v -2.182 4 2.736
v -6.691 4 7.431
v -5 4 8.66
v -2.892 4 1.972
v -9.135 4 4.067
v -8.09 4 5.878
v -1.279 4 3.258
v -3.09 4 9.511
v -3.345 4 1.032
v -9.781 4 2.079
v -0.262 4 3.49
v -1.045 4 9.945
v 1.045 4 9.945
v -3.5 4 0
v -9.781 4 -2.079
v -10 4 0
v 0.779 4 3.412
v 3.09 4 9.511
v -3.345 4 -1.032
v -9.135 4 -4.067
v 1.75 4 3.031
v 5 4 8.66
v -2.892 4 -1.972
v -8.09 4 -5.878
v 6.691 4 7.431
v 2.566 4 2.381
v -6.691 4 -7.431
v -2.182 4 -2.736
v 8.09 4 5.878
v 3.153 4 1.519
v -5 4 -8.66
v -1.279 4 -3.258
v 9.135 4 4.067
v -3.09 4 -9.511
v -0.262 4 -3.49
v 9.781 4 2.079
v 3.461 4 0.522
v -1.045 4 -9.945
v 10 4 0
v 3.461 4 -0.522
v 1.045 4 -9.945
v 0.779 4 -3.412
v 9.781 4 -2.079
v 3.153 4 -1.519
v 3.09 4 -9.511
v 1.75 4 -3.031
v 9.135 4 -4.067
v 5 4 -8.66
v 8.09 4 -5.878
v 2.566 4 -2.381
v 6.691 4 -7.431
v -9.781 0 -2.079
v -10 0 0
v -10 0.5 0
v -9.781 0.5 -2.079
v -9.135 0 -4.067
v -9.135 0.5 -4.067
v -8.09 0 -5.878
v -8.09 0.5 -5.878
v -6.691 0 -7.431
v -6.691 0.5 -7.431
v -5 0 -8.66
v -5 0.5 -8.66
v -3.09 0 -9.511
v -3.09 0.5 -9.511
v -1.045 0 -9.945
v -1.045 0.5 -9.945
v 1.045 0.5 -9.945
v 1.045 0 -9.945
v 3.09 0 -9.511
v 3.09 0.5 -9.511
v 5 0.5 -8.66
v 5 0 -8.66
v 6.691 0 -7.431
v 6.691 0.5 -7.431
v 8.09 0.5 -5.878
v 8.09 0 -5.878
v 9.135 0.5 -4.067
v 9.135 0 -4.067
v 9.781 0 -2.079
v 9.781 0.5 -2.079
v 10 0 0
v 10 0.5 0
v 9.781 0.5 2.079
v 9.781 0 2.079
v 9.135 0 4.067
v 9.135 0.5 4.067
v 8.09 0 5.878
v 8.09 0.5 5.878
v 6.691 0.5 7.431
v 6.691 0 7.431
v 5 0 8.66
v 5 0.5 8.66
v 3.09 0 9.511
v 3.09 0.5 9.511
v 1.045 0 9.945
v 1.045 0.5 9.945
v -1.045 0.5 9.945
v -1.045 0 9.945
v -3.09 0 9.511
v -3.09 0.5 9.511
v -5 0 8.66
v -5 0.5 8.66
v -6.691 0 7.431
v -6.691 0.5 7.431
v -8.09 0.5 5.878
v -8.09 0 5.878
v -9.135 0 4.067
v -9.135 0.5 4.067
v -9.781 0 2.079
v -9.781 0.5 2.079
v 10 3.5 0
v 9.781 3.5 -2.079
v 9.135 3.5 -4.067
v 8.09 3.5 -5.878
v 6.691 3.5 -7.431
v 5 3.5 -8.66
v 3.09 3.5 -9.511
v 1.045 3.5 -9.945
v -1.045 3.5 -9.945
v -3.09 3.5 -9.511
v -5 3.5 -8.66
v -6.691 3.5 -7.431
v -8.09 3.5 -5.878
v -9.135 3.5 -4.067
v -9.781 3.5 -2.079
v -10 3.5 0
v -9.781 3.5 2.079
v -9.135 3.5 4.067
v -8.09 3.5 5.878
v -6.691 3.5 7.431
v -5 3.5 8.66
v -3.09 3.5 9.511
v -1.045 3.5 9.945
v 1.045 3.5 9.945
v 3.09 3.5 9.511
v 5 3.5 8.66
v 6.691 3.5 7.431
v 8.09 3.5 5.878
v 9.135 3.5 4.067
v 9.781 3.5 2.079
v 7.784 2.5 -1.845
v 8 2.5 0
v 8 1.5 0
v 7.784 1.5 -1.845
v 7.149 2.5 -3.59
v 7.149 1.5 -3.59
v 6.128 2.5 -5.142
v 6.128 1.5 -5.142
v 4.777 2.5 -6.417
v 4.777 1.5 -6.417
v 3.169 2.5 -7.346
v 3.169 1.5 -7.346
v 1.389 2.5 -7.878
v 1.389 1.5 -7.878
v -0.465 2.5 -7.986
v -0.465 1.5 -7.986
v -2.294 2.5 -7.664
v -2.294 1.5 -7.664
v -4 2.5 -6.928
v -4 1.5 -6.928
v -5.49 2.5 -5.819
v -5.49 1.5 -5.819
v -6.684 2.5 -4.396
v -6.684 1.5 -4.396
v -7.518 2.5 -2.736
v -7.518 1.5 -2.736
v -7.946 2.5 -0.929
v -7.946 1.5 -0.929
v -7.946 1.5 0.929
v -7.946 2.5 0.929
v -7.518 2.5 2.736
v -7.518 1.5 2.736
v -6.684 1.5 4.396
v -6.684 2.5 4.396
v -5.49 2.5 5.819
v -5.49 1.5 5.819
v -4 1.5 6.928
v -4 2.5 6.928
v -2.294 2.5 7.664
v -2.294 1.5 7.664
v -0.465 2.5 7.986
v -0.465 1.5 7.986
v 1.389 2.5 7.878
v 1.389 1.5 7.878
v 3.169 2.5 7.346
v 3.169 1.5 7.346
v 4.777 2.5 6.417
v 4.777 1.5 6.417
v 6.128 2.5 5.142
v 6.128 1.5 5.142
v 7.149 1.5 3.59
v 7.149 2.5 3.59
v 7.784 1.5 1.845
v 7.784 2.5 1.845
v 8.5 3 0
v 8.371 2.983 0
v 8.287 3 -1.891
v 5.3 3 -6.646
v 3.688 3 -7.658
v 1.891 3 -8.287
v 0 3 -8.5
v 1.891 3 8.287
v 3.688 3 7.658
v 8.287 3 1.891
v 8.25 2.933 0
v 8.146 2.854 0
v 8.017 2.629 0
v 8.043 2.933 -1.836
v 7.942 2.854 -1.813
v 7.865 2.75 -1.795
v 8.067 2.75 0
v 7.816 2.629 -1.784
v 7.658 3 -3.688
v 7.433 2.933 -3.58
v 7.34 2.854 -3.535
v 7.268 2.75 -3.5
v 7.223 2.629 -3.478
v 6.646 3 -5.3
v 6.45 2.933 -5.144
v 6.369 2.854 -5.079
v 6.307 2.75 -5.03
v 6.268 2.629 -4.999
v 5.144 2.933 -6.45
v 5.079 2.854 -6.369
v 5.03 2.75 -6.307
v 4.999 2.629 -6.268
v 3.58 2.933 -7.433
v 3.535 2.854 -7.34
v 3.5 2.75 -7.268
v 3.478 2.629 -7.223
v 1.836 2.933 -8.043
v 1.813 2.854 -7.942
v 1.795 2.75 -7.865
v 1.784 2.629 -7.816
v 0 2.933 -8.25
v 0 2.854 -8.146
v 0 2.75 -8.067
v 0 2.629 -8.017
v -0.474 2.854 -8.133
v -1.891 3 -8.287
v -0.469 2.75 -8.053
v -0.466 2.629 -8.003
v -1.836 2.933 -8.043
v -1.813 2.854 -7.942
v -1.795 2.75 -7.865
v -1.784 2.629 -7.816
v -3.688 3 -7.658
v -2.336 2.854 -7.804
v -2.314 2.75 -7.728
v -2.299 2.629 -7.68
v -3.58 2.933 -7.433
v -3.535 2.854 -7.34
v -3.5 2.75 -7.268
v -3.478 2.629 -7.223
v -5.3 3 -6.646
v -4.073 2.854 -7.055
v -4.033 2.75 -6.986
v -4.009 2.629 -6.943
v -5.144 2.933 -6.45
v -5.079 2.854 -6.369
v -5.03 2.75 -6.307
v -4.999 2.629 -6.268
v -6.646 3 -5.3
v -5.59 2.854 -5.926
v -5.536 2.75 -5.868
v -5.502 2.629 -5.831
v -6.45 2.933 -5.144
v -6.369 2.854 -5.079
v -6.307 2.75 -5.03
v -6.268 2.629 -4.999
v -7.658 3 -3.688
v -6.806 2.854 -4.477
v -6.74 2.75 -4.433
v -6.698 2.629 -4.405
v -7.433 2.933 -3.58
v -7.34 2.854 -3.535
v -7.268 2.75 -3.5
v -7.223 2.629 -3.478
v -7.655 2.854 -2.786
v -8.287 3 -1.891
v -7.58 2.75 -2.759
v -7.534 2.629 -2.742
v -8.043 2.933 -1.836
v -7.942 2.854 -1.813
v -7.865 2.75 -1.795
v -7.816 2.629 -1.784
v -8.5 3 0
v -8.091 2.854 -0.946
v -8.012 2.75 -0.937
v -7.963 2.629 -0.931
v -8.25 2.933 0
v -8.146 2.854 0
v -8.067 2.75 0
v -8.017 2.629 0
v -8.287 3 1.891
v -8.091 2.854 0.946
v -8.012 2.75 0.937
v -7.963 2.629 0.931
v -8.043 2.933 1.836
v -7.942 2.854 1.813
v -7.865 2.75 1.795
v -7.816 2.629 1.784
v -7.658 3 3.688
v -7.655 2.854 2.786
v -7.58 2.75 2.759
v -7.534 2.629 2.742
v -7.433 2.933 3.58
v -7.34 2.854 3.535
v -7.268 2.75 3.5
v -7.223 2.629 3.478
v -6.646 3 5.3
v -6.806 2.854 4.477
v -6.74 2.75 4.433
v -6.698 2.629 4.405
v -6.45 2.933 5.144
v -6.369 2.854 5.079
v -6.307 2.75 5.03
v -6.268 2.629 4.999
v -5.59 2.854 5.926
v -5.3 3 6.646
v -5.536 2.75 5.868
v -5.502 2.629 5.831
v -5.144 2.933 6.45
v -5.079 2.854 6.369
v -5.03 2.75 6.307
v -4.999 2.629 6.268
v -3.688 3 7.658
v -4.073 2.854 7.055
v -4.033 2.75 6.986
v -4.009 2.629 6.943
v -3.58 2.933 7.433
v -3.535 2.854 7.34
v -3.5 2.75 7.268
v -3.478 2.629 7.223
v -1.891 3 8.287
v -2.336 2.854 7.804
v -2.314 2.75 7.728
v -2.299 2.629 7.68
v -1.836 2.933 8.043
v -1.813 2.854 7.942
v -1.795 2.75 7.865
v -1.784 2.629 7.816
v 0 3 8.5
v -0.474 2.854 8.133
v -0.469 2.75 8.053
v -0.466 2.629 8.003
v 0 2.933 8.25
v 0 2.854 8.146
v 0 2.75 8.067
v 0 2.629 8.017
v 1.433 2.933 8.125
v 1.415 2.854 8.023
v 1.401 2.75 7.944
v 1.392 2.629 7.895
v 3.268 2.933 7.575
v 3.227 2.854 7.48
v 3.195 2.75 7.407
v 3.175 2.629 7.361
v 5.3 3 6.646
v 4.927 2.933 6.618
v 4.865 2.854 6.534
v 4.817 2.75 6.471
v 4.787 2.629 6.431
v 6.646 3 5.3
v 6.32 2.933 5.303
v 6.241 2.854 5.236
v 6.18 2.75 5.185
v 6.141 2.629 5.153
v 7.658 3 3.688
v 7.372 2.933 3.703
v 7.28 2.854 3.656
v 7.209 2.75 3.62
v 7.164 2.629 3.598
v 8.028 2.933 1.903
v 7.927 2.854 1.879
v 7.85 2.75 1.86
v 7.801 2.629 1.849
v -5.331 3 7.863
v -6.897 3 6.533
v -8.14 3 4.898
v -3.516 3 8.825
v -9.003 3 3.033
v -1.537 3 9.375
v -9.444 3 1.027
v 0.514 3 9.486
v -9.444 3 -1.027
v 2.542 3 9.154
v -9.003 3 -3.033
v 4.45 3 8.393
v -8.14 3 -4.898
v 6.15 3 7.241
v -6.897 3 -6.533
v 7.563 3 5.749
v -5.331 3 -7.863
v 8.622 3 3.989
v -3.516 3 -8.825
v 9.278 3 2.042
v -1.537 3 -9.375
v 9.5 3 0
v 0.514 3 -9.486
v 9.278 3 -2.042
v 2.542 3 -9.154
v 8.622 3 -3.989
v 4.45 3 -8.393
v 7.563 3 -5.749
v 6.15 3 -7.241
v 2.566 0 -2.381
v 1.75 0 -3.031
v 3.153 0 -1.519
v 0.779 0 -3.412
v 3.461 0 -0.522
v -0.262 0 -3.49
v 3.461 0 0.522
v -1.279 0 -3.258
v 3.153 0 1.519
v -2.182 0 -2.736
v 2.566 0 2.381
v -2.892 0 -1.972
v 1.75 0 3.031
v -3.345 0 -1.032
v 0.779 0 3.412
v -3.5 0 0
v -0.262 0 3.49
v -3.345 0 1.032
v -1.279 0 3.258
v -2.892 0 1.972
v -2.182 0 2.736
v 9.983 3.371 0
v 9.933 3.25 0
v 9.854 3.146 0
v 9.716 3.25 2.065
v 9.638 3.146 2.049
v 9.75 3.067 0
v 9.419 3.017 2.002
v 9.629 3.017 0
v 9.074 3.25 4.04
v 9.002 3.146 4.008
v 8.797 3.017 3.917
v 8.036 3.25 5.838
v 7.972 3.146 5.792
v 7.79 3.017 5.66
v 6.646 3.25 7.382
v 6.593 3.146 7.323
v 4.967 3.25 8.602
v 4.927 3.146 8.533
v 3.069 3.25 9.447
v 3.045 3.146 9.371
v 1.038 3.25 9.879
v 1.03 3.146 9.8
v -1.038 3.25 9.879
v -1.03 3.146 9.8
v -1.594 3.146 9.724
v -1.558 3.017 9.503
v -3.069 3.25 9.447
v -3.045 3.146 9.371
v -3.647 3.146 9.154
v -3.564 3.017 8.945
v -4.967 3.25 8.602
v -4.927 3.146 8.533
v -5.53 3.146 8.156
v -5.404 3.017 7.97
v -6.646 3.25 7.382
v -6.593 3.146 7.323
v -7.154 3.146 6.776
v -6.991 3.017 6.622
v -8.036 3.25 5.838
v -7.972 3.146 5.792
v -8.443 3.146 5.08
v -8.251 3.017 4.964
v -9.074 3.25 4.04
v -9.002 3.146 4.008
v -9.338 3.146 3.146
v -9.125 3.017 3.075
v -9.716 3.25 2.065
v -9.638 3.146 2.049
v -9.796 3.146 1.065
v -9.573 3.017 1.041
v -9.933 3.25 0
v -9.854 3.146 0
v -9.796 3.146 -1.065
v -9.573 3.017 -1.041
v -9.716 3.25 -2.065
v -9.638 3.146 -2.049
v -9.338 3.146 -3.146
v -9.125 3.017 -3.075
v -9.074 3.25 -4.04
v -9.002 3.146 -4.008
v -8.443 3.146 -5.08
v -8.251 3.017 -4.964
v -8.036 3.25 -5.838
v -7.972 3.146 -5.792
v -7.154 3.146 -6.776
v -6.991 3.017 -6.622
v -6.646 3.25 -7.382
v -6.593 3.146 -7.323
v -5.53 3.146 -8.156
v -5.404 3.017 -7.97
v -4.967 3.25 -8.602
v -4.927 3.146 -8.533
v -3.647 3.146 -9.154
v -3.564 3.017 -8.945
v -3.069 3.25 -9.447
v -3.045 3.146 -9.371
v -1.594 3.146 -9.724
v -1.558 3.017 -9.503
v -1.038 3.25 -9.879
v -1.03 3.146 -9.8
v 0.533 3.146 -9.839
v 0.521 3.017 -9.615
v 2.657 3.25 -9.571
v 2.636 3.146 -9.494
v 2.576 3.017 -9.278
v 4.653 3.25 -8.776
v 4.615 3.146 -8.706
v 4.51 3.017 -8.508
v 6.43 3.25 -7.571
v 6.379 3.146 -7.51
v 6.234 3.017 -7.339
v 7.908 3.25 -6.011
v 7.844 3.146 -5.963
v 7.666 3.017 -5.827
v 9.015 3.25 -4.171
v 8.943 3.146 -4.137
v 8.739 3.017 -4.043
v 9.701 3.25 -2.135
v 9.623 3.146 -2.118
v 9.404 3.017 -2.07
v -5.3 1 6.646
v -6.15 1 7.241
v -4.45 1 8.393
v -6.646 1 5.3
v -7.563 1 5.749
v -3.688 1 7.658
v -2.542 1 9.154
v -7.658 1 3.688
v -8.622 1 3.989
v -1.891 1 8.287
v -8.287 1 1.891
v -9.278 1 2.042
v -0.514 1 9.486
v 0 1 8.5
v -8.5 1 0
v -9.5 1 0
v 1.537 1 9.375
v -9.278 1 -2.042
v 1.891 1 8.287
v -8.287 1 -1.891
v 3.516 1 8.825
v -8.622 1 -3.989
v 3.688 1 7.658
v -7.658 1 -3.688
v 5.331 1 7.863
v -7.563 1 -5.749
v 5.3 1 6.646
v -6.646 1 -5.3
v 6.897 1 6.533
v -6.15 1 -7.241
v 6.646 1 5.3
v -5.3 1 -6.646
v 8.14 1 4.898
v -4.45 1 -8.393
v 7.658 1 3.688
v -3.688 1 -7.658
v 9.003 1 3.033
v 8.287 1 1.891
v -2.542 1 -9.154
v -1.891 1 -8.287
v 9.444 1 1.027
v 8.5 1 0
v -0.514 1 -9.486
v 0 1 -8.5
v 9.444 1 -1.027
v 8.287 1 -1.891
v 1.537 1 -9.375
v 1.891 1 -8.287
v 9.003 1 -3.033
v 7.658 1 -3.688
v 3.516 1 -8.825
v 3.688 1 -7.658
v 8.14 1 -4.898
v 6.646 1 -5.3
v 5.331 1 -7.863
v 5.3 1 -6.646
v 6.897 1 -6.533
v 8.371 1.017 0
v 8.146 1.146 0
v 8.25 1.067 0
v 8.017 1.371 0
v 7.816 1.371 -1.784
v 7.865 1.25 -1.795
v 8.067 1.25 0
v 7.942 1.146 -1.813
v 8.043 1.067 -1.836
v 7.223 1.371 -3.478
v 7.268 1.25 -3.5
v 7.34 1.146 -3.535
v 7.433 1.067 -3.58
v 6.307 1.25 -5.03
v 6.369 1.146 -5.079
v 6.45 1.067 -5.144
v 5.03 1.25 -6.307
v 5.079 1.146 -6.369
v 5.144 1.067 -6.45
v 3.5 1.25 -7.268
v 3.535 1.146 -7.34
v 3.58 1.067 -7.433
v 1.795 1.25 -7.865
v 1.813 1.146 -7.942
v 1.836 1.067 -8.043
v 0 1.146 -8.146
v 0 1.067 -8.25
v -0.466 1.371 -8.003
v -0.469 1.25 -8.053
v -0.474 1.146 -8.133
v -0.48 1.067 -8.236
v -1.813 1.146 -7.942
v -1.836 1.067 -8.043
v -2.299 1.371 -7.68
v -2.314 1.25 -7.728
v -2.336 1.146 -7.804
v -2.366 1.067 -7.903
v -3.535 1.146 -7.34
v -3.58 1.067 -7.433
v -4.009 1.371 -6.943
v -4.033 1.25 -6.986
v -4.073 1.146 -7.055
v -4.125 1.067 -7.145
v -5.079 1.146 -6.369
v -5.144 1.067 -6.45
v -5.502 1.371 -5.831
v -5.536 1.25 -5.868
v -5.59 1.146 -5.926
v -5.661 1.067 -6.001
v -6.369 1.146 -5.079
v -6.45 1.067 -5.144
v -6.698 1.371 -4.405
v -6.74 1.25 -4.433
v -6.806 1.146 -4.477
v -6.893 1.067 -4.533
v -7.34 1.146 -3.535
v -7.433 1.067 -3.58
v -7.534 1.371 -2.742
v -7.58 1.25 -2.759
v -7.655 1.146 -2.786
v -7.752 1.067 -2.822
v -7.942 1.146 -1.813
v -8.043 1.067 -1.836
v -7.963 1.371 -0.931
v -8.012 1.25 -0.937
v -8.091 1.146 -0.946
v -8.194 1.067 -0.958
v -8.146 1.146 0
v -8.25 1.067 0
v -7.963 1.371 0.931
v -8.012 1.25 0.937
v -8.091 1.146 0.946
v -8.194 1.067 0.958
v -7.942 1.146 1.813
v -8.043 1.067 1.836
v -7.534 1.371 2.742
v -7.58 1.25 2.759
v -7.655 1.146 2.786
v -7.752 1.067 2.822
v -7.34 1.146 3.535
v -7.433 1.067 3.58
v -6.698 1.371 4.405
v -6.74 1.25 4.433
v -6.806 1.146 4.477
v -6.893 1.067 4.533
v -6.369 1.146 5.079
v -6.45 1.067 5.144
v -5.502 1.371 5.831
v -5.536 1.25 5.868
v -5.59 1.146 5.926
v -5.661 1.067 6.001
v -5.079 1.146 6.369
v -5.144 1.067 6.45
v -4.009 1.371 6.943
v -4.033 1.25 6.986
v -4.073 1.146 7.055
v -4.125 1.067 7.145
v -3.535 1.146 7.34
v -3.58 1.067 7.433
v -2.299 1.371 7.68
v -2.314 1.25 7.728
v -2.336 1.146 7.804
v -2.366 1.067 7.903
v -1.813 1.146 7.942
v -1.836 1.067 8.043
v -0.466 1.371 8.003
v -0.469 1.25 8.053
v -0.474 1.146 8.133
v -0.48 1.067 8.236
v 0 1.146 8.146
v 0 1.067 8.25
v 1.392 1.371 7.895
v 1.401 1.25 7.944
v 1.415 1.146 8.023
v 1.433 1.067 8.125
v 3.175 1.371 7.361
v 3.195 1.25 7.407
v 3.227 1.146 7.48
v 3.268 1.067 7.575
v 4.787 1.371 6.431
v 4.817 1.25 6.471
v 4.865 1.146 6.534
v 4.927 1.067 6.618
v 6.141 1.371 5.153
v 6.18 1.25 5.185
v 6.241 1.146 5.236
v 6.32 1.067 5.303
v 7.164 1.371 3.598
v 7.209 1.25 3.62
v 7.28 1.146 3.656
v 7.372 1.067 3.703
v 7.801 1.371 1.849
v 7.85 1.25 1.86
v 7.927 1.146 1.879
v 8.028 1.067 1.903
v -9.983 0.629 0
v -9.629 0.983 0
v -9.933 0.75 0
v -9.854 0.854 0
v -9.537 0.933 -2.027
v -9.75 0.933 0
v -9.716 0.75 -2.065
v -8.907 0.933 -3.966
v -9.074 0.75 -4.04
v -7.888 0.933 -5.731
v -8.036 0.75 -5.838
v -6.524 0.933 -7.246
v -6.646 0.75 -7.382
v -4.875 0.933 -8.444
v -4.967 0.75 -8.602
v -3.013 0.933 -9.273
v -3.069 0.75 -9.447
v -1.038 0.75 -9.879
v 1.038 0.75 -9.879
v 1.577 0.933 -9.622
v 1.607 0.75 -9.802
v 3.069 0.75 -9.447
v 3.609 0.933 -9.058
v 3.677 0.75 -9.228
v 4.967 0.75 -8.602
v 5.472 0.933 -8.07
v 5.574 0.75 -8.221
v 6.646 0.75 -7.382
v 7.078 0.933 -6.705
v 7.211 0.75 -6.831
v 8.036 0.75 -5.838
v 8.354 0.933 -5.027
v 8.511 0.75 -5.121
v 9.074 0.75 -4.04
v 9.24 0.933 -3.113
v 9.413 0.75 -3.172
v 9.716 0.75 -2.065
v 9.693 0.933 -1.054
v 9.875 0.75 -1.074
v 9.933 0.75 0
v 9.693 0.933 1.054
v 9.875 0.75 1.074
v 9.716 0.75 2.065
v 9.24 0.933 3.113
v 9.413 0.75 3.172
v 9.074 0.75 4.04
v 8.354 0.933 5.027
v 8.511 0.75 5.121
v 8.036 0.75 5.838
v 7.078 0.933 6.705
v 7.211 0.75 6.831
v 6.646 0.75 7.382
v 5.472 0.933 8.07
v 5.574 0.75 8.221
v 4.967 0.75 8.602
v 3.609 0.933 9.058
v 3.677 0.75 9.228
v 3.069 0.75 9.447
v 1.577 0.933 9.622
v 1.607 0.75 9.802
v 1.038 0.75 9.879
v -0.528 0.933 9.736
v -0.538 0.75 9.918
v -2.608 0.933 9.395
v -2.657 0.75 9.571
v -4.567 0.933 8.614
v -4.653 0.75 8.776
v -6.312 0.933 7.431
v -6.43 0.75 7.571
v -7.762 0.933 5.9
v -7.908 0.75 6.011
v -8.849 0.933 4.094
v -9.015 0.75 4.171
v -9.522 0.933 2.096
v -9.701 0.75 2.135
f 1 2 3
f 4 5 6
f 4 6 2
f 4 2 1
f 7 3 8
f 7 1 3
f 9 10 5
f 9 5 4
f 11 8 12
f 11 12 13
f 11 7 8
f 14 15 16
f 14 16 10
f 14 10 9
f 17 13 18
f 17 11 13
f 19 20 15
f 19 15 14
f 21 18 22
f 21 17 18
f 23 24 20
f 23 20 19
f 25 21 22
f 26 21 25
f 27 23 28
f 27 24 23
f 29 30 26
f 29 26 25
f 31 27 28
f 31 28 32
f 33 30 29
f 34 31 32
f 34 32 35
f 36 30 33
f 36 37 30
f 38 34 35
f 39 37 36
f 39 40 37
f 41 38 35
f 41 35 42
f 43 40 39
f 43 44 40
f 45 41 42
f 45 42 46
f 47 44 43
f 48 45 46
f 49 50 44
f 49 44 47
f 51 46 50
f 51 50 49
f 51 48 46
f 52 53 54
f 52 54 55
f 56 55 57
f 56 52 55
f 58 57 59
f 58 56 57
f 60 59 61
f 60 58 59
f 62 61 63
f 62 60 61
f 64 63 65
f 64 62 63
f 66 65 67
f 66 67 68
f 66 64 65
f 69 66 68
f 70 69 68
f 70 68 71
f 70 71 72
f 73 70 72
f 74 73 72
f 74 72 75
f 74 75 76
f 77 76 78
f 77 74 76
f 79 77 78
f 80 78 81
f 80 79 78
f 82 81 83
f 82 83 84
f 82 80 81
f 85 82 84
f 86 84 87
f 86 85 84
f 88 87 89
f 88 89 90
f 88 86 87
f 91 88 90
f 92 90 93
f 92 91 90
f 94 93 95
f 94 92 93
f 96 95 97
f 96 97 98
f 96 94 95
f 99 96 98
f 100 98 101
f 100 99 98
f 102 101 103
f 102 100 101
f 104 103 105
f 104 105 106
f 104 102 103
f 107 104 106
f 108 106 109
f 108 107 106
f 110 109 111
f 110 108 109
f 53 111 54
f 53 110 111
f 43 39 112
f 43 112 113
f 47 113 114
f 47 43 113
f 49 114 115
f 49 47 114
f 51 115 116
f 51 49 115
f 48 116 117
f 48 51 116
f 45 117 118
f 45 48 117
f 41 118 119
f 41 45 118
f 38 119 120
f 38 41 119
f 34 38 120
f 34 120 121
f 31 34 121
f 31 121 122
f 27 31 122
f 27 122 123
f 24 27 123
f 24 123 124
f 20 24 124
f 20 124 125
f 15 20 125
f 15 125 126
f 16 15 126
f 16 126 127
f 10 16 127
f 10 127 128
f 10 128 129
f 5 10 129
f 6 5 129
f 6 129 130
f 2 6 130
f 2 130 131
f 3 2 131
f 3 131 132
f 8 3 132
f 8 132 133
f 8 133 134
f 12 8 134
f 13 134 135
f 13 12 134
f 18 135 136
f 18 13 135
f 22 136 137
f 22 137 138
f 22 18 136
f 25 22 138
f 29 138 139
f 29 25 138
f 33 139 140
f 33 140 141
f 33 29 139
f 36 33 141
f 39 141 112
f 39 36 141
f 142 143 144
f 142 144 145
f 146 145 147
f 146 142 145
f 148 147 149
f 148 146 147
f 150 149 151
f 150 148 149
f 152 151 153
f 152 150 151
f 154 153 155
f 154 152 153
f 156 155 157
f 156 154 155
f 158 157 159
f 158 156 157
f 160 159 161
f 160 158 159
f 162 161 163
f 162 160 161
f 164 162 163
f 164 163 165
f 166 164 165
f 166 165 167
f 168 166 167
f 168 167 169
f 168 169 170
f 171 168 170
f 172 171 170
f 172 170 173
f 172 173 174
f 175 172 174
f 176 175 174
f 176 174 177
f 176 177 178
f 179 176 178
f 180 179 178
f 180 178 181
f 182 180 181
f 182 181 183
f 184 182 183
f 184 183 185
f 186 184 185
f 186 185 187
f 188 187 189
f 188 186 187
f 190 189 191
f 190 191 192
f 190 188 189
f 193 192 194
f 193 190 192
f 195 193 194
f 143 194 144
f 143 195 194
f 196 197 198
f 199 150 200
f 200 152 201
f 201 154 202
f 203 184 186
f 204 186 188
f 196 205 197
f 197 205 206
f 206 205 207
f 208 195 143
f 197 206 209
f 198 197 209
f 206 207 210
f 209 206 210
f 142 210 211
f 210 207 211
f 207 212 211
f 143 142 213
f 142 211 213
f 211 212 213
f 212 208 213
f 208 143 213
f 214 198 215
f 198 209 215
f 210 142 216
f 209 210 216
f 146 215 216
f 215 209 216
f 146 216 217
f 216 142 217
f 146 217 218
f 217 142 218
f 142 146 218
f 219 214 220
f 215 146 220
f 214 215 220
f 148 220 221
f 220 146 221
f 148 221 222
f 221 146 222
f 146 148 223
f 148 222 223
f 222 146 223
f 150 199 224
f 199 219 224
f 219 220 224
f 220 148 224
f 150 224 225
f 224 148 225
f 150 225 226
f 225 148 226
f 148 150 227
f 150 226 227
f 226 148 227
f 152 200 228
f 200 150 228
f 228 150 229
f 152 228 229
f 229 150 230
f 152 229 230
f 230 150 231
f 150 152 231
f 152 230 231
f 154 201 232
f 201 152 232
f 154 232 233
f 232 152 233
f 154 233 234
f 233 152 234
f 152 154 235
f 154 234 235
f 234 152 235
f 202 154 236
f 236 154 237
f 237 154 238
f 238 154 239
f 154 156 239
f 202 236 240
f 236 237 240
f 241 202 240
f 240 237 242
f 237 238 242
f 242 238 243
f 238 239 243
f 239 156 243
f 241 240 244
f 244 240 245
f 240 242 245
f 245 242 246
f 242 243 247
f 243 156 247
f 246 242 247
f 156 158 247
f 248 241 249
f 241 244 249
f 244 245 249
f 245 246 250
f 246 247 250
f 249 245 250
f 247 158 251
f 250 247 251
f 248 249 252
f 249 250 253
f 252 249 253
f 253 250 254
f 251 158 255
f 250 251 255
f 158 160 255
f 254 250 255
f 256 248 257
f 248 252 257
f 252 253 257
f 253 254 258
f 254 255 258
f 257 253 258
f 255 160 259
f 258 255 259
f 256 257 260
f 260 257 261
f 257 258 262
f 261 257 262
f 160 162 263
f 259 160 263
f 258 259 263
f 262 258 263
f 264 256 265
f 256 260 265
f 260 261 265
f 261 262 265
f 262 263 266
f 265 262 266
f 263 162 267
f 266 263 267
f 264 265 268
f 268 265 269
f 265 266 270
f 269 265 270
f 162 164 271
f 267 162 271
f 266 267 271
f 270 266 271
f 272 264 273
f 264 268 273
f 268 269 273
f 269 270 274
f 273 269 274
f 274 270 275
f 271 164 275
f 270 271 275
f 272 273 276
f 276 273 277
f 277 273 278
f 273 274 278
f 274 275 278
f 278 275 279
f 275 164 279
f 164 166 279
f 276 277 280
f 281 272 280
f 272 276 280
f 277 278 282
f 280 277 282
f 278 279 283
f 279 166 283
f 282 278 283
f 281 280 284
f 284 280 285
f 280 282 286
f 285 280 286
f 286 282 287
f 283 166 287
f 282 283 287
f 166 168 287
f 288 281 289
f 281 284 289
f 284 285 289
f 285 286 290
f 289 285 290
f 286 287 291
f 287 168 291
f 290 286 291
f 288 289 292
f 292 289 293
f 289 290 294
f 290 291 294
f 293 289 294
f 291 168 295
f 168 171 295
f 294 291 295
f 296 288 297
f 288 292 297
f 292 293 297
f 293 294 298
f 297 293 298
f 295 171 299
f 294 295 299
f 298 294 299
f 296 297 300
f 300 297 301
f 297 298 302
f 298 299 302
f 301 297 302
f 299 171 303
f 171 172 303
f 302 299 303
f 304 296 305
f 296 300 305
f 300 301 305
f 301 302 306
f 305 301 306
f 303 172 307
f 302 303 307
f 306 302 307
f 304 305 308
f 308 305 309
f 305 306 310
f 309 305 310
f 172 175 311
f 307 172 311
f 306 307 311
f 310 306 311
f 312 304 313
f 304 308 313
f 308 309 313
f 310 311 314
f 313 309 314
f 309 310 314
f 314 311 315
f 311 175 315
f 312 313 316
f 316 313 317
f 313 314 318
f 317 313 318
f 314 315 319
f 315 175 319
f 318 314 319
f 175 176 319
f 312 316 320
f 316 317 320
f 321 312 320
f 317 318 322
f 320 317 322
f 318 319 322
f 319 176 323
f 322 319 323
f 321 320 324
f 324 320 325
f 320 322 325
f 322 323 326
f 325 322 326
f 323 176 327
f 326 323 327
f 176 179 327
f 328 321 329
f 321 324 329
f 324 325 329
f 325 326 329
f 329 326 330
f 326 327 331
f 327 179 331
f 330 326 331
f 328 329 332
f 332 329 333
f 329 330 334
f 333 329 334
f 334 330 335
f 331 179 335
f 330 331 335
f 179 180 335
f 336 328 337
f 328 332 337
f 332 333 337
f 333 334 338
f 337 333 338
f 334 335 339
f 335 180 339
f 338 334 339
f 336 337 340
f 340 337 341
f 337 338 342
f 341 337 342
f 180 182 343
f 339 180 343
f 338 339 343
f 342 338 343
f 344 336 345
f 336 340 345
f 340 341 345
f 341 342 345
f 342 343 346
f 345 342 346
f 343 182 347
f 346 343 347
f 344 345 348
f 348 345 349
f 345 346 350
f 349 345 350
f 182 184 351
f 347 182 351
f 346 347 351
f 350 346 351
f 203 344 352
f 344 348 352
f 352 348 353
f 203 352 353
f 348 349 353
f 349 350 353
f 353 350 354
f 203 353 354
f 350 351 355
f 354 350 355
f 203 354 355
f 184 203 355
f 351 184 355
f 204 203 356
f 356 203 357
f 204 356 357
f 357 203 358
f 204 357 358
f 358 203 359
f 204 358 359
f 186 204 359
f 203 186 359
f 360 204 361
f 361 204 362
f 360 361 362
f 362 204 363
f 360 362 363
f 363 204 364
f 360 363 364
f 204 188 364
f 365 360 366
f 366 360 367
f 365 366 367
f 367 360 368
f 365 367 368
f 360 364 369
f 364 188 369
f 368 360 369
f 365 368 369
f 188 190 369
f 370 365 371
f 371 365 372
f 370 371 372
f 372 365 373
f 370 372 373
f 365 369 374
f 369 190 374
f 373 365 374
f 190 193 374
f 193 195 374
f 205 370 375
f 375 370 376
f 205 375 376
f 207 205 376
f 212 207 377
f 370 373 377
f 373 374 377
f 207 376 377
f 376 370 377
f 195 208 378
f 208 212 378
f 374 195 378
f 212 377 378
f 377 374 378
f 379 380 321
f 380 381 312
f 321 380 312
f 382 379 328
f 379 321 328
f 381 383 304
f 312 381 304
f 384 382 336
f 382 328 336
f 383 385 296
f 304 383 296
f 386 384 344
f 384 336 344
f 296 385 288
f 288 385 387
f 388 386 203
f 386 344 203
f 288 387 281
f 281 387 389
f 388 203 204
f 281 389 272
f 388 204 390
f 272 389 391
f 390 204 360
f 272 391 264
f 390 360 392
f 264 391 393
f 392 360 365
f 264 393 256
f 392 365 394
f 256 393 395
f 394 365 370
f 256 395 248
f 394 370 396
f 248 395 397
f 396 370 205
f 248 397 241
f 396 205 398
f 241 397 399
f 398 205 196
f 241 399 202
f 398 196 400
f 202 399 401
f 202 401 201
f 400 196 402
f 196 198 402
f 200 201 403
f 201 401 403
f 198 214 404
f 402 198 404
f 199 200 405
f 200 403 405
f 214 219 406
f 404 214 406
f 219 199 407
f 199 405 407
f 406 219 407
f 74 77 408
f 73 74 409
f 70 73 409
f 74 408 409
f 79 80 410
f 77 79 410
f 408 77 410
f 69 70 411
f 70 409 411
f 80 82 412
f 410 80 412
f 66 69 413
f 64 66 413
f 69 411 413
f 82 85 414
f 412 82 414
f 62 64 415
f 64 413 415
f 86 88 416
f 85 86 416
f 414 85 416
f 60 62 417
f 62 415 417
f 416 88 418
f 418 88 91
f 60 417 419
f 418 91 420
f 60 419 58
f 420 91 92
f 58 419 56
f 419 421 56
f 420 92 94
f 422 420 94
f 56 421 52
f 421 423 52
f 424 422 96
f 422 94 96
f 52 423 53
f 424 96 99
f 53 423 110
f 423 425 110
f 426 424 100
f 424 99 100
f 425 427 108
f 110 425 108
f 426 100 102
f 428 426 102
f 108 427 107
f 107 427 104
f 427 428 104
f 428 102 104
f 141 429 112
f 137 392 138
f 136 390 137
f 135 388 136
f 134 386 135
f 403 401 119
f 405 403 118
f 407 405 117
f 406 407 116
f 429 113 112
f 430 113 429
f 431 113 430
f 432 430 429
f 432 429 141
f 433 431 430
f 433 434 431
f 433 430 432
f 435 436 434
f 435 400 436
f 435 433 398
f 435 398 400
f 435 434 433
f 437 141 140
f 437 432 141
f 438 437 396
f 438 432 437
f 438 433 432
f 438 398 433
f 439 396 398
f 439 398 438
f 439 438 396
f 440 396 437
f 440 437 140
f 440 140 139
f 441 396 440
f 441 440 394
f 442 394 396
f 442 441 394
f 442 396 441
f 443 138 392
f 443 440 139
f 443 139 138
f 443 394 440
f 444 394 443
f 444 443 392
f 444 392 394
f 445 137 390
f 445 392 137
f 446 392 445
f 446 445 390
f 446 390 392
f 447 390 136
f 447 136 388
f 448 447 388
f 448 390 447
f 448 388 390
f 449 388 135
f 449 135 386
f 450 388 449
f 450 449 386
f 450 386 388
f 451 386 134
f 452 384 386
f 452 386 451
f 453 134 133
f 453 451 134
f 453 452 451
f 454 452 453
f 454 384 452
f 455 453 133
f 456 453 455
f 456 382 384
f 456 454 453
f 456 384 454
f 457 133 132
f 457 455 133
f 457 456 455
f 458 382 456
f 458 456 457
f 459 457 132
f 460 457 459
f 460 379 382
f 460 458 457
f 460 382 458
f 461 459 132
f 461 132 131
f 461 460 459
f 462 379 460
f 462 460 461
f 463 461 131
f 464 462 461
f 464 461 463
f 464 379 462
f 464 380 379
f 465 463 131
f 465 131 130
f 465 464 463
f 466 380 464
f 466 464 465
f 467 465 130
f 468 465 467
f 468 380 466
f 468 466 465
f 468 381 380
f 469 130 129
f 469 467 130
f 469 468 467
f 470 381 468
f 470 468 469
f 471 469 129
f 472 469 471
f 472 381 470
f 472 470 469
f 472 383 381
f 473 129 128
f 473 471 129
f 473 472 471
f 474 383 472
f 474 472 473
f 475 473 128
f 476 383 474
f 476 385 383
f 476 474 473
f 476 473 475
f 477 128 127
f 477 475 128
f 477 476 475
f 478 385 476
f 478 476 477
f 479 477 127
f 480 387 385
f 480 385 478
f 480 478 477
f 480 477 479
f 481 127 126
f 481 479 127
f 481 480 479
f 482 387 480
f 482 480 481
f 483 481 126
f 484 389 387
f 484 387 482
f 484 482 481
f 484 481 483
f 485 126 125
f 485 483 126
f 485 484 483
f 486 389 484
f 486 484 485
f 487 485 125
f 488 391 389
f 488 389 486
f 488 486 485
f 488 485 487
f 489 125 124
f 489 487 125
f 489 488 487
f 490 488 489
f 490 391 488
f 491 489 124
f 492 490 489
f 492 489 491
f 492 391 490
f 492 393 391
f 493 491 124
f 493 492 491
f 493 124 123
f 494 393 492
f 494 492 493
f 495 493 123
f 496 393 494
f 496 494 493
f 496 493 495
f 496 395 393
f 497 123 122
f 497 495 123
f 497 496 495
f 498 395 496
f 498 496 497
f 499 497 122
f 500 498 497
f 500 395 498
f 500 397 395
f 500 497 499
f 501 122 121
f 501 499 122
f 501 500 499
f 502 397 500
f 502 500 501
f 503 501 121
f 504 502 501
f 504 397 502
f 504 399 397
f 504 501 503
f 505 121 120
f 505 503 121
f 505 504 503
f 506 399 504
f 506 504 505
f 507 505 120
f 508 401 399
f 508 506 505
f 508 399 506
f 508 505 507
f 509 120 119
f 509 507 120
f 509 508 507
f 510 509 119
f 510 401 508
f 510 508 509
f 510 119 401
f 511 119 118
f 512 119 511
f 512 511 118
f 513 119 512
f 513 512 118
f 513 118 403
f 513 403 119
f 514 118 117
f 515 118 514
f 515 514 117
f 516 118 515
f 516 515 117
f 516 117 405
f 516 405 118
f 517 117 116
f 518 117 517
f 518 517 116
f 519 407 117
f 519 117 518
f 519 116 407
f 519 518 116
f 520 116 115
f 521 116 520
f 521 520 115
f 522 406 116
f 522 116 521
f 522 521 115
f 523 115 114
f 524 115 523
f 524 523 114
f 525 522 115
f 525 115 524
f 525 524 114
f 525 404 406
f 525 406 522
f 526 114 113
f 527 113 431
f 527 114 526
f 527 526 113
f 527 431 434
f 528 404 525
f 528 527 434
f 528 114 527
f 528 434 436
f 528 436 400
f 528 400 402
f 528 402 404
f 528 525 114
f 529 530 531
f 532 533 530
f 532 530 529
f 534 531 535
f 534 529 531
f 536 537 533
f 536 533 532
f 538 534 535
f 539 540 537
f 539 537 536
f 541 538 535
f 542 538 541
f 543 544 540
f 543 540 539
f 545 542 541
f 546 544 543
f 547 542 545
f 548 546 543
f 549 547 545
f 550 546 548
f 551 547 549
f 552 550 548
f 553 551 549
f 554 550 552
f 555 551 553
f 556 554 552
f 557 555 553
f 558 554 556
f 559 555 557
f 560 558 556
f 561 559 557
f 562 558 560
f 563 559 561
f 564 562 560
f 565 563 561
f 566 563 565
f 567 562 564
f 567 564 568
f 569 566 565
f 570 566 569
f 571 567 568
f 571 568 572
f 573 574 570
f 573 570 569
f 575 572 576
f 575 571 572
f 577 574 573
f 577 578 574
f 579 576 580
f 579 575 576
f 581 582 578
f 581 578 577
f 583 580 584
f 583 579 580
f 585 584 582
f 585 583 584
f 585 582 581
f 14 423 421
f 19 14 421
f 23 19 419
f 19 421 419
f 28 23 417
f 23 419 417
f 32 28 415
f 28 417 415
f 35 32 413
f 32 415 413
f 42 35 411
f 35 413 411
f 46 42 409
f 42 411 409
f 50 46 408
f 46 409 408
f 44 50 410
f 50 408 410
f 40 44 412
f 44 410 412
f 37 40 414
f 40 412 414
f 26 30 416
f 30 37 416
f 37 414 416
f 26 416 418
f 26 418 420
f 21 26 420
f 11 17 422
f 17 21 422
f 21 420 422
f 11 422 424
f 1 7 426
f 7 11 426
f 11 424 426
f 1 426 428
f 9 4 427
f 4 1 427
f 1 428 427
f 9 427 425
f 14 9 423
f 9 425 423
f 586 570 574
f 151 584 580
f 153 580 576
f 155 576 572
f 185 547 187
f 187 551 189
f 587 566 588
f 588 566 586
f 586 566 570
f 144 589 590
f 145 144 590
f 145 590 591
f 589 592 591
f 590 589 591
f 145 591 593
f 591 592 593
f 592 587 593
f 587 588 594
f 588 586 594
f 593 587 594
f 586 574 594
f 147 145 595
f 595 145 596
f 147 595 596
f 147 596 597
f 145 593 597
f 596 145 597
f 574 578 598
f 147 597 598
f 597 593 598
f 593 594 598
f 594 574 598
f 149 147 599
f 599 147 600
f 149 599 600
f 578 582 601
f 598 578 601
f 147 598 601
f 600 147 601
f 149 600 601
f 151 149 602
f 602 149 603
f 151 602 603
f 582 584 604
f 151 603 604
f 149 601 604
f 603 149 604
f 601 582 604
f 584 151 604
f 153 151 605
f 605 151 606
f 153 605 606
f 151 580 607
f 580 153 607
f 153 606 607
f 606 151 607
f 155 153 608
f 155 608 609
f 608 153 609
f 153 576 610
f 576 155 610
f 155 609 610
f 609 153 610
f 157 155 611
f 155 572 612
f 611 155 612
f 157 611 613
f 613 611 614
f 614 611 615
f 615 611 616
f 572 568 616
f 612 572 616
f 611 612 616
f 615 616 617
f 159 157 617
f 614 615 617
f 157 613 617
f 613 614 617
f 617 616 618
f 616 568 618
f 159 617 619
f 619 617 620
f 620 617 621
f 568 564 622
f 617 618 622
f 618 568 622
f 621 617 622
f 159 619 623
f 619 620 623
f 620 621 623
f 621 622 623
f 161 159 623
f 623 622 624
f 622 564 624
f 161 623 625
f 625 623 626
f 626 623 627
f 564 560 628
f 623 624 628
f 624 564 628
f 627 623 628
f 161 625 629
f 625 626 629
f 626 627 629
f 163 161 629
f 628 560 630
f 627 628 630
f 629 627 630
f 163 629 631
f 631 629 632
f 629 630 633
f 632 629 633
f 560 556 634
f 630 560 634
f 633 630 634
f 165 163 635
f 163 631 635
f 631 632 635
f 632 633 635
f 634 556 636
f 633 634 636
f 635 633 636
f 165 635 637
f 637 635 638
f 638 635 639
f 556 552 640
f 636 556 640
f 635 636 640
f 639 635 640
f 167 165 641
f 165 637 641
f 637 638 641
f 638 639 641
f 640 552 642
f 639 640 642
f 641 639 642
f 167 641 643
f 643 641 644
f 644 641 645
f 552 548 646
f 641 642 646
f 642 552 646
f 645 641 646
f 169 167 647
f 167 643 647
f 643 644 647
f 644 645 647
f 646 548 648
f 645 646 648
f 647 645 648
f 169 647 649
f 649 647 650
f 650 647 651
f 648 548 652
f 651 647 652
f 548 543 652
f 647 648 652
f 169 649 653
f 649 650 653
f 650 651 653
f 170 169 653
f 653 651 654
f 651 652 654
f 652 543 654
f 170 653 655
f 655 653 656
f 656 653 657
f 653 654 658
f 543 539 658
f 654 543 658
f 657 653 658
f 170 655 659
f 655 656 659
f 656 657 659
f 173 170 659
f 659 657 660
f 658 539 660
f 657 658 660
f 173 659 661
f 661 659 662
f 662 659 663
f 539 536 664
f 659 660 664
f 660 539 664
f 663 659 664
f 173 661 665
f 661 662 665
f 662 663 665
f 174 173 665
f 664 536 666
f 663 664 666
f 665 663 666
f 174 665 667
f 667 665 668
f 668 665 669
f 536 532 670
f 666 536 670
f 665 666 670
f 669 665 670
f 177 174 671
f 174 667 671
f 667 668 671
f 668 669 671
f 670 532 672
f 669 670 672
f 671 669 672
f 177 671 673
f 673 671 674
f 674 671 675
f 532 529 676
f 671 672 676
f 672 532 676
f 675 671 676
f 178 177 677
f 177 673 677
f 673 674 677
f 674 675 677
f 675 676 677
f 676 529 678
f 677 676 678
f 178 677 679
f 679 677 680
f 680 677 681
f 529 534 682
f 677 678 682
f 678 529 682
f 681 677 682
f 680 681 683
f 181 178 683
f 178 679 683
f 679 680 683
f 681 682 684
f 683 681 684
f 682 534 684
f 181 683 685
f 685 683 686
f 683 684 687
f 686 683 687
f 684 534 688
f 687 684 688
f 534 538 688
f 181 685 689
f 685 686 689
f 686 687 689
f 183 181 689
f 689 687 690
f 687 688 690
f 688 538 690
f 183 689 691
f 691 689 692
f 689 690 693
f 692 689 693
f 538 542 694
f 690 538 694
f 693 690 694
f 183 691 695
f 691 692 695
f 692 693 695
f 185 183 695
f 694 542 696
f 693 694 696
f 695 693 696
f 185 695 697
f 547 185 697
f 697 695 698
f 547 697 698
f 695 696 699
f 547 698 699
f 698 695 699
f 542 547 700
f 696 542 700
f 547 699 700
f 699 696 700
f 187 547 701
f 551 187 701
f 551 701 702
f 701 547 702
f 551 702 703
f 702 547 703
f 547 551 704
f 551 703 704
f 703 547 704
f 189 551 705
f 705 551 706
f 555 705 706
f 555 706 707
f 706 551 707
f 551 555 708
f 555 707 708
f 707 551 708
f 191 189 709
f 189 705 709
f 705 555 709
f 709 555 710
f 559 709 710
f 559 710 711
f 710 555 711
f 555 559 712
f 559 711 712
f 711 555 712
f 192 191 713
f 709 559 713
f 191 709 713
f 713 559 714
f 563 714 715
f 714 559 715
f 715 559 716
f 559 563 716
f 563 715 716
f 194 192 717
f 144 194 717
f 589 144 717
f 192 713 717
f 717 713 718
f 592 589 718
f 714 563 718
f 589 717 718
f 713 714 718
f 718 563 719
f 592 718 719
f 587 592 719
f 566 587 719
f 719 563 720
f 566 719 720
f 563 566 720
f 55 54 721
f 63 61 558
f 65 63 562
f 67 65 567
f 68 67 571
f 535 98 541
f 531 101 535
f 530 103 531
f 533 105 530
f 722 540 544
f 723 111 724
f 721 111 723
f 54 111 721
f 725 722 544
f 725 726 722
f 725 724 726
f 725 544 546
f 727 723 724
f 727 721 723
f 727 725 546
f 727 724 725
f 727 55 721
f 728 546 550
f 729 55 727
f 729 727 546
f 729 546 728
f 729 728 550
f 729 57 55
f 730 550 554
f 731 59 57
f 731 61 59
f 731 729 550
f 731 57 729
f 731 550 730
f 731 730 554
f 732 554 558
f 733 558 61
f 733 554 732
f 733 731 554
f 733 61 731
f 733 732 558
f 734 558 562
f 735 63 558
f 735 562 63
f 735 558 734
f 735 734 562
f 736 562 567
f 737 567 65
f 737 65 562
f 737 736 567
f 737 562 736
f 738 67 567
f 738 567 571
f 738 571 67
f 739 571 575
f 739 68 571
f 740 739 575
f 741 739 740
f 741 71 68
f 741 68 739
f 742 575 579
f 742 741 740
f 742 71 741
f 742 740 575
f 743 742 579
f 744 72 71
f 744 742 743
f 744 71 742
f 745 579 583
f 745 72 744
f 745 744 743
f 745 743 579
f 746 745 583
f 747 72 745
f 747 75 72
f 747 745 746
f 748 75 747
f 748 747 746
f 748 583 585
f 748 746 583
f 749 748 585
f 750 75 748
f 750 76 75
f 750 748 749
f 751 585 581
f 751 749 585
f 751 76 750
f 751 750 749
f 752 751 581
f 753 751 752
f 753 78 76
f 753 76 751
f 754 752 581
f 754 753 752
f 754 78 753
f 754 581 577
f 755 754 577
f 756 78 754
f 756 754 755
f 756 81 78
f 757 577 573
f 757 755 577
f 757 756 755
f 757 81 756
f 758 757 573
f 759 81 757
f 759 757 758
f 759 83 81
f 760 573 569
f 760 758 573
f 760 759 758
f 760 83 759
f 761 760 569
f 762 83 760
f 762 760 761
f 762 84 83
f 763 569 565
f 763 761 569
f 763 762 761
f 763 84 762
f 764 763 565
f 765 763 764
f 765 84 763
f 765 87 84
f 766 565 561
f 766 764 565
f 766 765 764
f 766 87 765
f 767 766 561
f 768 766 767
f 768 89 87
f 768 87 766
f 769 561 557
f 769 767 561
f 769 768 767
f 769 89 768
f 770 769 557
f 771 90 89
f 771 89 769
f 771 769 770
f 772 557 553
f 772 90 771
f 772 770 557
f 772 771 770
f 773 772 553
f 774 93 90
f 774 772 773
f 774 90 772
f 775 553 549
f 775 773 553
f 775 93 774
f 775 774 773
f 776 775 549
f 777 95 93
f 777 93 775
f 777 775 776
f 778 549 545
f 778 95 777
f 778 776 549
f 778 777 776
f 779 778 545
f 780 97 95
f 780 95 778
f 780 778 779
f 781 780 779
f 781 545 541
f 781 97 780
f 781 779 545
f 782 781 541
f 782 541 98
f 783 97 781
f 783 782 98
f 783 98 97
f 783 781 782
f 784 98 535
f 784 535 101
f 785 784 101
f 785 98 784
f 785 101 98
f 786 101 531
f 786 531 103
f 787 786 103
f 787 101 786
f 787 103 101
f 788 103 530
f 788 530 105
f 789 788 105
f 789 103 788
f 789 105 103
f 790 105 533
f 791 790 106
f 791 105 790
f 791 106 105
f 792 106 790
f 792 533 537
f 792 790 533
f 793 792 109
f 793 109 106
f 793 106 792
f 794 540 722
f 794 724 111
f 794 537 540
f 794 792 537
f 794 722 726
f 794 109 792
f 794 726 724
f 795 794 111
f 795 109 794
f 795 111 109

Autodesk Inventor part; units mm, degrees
ref_plane "YZ Plane" through (0, 0, 0) normal (1, 0, 0) x (0, 1, 0)
ref_plane "XZ Plane" through (0, 0, 0) normal (0, 1, 0) x (-1, 0, 0)
ref_plane "XY Plane" through (0, 0, 0) normal (0, 0, 1) x (1, 0, 0)
sketch "Boceto1" plane through (0, 0, 0) normal (0, 1, 0) x (-1, 0, 0)
  circle A0 centre (0, 0) radius 10
  circle A1 centre (0, 0) radius 3.5
  dimension "d0" = 20
  dimension "d1" = 7
extrude "Extrusión1" add sketch "Boceto1" along normal blind 4
sketch "Boceto2" plane through (0, 4, 0) normal (0, 1, 0) x (1, 0, 0)
  circle A0 centre (0, 0) radius 8
  circle A1 centre (0, 0) radius 3.5 projected
  circle A2 centre (0, 0) radius 10 projected
  dimension "d4" = 16
extrude "Extrusión2" cut sketch "Boceto2" against normal blind 3 contours A2
sketch "Boceto3" plane through (0, 4, 0) normal (0, 1, 0) x (1, 0, 0)
  circle A0 centre (0, 0) radius 8
  circle A1 centre (0, 0) radius 3.5
  circle A2 centre (0, 0) radius 10
  dimension "d7" = 16
extrude "Extrusión3" add sketch "Boceto3" against normal blind 1 contours A2
fillet "Empalme1" radius 0.5 4 edges at (-8, 1, 0) (-8, 3, 0) (-10, 3, 0) (10, 1, 0)
properties part number "servo pulley"
